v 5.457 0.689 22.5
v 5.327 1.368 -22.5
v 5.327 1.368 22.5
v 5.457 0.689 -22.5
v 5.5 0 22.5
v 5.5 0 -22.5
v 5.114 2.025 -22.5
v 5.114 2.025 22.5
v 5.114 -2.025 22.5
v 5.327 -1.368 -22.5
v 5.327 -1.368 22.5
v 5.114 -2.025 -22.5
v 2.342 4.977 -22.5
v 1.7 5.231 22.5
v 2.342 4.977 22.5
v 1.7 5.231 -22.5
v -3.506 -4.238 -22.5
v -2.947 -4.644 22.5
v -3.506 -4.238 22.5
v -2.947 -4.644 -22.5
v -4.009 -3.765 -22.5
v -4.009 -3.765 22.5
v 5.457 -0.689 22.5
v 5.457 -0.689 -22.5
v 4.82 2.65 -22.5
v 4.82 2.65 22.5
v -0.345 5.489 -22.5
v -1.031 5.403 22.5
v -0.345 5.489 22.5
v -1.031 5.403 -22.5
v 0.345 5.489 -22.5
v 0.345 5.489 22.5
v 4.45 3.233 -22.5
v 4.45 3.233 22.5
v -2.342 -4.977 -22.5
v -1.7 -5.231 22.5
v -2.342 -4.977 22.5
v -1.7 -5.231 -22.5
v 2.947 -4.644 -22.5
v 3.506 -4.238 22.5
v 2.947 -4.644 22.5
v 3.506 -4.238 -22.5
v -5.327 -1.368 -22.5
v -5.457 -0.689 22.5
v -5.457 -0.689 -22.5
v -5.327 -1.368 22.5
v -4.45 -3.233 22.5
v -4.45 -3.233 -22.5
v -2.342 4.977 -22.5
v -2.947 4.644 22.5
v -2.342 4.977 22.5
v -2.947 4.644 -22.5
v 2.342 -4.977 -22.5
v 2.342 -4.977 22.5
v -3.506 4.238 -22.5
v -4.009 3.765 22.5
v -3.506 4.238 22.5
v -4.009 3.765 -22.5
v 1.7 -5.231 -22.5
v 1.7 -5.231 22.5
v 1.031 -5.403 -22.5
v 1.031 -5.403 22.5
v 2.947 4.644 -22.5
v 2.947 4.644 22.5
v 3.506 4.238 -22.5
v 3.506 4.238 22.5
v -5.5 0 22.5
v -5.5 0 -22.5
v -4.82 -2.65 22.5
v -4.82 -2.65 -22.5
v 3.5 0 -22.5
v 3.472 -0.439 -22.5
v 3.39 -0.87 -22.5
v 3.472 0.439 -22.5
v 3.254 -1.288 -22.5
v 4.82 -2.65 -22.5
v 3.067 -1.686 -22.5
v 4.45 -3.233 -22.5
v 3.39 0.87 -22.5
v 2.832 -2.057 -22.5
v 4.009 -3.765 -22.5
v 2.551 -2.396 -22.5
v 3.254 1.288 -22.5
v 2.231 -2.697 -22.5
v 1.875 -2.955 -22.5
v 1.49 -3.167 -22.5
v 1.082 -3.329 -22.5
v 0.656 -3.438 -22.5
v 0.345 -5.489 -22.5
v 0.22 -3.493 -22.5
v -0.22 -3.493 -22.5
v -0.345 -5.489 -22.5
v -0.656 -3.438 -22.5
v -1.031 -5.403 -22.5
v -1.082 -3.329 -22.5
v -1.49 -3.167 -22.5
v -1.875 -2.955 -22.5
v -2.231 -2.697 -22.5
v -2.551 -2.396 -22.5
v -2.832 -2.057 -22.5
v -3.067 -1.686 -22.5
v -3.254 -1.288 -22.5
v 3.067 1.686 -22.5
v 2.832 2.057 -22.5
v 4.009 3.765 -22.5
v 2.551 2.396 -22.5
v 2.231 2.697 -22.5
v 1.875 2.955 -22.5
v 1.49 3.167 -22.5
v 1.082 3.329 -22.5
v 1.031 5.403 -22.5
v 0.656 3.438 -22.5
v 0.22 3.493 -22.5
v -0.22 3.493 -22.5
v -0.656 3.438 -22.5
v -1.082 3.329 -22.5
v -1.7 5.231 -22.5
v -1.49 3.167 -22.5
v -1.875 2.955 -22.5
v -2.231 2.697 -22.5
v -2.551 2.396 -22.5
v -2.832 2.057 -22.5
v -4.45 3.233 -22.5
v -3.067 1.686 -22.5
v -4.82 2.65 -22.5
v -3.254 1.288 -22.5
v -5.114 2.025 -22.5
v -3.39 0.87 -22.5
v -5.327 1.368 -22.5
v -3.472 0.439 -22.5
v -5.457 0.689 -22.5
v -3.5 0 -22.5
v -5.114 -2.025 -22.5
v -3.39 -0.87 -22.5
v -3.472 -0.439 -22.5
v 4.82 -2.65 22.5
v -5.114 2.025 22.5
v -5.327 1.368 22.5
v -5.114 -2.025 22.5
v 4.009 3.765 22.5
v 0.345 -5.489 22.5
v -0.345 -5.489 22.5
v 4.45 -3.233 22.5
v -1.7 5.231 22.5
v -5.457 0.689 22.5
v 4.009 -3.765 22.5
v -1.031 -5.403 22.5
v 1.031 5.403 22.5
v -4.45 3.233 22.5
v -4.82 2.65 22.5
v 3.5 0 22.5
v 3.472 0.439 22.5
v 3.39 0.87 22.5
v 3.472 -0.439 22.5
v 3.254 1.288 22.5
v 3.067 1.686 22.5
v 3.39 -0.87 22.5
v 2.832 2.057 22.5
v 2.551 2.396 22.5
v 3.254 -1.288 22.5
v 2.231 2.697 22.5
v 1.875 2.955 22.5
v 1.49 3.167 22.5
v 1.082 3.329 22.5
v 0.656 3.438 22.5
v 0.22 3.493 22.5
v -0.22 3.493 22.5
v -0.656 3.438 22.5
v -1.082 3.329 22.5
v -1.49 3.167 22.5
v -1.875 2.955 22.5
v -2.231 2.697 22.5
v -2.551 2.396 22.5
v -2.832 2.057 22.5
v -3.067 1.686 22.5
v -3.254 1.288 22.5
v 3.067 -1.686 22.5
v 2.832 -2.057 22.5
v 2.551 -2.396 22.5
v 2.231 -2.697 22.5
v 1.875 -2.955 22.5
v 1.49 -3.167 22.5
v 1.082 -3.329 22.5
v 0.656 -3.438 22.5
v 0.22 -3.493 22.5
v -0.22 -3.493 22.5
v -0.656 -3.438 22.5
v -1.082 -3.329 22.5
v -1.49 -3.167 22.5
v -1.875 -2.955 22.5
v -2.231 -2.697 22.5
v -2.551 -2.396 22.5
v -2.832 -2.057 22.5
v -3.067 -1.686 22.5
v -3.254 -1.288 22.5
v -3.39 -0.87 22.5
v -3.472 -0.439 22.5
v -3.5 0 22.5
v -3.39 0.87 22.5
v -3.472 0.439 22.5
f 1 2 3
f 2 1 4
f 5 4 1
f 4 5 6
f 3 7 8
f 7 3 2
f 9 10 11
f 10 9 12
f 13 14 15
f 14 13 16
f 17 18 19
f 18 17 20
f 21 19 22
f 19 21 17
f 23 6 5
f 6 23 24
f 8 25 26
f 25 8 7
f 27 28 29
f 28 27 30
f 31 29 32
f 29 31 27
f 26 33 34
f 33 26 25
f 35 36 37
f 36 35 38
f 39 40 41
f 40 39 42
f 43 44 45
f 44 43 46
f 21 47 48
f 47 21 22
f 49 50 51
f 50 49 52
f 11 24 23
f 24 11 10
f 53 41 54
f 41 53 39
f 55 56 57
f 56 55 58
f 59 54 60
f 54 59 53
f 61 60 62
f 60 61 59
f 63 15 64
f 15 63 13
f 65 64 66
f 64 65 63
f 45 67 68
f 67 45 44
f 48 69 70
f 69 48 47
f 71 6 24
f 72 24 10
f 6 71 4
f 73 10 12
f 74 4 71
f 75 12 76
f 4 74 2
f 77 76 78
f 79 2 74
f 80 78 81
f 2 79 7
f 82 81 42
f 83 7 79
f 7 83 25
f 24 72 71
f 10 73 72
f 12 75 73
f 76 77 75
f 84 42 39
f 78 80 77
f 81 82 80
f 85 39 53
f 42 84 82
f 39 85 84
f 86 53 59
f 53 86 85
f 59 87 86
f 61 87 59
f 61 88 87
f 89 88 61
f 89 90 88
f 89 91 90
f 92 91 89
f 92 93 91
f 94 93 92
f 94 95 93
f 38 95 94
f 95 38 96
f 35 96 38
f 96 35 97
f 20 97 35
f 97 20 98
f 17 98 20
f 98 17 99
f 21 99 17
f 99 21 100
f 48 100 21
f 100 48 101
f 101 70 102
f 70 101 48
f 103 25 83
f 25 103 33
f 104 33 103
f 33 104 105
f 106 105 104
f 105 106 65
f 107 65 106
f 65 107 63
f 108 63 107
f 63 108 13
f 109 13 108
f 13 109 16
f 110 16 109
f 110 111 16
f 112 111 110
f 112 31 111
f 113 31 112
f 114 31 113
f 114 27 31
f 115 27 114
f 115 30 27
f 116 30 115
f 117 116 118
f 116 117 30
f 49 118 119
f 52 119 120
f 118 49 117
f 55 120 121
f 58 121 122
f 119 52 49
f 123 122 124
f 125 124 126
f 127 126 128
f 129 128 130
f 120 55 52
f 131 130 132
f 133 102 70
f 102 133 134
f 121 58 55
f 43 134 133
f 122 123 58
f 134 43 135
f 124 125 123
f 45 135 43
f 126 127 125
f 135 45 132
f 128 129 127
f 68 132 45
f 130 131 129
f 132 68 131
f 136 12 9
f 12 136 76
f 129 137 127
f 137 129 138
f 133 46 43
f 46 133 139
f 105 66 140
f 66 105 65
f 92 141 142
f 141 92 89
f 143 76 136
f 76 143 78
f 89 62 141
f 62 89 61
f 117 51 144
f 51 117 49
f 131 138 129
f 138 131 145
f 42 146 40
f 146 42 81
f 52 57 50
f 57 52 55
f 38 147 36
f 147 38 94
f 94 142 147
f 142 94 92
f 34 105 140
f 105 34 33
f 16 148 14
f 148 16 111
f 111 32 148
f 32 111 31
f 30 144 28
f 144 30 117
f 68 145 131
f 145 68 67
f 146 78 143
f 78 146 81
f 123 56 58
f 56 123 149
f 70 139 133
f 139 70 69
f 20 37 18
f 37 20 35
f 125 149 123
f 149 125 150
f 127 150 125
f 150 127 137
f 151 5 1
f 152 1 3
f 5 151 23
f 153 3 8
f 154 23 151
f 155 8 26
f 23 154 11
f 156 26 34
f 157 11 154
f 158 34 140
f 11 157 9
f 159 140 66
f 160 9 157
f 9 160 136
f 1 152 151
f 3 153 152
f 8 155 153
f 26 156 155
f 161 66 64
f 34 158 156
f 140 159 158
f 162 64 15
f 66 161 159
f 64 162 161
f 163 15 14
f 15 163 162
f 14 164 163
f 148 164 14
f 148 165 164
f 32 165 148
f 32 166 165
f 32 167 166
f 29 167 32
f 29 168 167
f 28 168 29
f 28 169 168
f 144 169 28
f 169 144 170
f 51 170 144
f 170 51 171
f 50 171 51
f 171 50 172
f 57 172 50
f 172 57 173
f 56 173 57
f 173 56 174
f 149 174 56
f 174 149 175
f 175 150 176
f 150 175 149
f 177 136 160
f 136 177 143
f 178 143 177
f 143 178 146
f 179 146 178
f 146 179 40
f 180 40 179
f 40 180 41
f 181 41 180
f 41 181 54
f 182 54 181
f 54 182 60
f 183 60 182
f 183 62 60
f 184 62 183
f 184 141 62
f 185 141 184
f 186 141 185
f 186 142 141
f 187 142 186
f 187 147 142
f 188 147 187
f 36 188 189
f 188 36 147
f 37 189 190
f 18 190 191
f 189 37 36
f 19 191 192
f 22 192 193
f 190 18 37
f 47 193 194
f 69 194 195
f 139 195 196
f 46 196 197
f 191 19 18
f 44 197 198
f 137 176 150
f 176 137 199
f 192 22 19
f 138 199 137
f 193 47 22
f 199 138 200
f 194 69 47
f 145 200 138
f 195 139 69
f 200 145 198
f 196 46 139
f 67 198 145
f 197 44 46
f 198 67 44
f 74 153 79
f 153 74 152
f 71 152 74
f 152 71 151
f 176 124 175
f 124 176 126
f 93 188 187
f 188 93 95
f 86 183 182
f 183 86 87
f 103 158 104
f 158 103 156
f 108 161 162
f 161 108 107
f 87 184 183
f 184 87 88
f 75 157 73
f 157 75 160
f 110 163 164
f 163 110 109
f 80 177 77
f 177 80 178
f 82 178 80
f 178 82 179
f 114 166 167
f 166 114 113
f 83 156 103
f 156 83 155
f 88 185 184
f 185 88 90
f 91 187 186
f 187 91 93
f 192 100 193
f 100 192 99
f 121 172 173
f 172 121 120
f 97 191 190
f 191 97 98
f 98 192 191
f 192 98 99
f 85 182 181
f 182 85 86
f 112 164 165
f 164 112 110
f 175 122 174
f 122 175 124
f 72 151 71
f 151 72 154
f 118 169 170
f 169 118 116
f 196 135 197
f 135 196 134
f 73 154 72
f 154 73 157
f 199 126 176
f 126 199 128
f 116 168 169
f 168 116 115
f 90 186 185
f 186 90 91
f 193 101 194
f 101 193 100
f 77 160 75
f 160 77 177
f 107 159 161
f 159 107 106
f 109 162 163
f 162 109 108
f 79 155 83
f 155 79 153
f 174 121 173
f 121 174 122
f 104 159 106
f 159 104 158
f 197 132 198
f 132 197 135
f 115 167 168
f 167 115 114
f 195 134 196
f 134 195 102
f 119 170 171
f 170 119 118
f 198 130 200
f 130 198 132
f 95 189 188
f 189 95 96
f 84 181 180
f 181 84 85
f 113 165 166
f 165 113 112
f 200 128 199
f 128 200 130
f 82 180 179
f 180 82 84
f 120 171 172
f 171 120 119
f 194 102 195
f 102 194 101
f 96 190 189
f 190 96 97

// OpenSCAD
$fn = 50;


difference() {
	union() {
		translate(v = [0, 0, -22.5000000000]) {
			cylinder(h = 45, r = 5.5000000000);
		}
	}
	union() {
		translate(v = [0, 0, -100.0000000000]) {
			cylinder(h = 200, r = 3.5000000000);
		}
	}
}
